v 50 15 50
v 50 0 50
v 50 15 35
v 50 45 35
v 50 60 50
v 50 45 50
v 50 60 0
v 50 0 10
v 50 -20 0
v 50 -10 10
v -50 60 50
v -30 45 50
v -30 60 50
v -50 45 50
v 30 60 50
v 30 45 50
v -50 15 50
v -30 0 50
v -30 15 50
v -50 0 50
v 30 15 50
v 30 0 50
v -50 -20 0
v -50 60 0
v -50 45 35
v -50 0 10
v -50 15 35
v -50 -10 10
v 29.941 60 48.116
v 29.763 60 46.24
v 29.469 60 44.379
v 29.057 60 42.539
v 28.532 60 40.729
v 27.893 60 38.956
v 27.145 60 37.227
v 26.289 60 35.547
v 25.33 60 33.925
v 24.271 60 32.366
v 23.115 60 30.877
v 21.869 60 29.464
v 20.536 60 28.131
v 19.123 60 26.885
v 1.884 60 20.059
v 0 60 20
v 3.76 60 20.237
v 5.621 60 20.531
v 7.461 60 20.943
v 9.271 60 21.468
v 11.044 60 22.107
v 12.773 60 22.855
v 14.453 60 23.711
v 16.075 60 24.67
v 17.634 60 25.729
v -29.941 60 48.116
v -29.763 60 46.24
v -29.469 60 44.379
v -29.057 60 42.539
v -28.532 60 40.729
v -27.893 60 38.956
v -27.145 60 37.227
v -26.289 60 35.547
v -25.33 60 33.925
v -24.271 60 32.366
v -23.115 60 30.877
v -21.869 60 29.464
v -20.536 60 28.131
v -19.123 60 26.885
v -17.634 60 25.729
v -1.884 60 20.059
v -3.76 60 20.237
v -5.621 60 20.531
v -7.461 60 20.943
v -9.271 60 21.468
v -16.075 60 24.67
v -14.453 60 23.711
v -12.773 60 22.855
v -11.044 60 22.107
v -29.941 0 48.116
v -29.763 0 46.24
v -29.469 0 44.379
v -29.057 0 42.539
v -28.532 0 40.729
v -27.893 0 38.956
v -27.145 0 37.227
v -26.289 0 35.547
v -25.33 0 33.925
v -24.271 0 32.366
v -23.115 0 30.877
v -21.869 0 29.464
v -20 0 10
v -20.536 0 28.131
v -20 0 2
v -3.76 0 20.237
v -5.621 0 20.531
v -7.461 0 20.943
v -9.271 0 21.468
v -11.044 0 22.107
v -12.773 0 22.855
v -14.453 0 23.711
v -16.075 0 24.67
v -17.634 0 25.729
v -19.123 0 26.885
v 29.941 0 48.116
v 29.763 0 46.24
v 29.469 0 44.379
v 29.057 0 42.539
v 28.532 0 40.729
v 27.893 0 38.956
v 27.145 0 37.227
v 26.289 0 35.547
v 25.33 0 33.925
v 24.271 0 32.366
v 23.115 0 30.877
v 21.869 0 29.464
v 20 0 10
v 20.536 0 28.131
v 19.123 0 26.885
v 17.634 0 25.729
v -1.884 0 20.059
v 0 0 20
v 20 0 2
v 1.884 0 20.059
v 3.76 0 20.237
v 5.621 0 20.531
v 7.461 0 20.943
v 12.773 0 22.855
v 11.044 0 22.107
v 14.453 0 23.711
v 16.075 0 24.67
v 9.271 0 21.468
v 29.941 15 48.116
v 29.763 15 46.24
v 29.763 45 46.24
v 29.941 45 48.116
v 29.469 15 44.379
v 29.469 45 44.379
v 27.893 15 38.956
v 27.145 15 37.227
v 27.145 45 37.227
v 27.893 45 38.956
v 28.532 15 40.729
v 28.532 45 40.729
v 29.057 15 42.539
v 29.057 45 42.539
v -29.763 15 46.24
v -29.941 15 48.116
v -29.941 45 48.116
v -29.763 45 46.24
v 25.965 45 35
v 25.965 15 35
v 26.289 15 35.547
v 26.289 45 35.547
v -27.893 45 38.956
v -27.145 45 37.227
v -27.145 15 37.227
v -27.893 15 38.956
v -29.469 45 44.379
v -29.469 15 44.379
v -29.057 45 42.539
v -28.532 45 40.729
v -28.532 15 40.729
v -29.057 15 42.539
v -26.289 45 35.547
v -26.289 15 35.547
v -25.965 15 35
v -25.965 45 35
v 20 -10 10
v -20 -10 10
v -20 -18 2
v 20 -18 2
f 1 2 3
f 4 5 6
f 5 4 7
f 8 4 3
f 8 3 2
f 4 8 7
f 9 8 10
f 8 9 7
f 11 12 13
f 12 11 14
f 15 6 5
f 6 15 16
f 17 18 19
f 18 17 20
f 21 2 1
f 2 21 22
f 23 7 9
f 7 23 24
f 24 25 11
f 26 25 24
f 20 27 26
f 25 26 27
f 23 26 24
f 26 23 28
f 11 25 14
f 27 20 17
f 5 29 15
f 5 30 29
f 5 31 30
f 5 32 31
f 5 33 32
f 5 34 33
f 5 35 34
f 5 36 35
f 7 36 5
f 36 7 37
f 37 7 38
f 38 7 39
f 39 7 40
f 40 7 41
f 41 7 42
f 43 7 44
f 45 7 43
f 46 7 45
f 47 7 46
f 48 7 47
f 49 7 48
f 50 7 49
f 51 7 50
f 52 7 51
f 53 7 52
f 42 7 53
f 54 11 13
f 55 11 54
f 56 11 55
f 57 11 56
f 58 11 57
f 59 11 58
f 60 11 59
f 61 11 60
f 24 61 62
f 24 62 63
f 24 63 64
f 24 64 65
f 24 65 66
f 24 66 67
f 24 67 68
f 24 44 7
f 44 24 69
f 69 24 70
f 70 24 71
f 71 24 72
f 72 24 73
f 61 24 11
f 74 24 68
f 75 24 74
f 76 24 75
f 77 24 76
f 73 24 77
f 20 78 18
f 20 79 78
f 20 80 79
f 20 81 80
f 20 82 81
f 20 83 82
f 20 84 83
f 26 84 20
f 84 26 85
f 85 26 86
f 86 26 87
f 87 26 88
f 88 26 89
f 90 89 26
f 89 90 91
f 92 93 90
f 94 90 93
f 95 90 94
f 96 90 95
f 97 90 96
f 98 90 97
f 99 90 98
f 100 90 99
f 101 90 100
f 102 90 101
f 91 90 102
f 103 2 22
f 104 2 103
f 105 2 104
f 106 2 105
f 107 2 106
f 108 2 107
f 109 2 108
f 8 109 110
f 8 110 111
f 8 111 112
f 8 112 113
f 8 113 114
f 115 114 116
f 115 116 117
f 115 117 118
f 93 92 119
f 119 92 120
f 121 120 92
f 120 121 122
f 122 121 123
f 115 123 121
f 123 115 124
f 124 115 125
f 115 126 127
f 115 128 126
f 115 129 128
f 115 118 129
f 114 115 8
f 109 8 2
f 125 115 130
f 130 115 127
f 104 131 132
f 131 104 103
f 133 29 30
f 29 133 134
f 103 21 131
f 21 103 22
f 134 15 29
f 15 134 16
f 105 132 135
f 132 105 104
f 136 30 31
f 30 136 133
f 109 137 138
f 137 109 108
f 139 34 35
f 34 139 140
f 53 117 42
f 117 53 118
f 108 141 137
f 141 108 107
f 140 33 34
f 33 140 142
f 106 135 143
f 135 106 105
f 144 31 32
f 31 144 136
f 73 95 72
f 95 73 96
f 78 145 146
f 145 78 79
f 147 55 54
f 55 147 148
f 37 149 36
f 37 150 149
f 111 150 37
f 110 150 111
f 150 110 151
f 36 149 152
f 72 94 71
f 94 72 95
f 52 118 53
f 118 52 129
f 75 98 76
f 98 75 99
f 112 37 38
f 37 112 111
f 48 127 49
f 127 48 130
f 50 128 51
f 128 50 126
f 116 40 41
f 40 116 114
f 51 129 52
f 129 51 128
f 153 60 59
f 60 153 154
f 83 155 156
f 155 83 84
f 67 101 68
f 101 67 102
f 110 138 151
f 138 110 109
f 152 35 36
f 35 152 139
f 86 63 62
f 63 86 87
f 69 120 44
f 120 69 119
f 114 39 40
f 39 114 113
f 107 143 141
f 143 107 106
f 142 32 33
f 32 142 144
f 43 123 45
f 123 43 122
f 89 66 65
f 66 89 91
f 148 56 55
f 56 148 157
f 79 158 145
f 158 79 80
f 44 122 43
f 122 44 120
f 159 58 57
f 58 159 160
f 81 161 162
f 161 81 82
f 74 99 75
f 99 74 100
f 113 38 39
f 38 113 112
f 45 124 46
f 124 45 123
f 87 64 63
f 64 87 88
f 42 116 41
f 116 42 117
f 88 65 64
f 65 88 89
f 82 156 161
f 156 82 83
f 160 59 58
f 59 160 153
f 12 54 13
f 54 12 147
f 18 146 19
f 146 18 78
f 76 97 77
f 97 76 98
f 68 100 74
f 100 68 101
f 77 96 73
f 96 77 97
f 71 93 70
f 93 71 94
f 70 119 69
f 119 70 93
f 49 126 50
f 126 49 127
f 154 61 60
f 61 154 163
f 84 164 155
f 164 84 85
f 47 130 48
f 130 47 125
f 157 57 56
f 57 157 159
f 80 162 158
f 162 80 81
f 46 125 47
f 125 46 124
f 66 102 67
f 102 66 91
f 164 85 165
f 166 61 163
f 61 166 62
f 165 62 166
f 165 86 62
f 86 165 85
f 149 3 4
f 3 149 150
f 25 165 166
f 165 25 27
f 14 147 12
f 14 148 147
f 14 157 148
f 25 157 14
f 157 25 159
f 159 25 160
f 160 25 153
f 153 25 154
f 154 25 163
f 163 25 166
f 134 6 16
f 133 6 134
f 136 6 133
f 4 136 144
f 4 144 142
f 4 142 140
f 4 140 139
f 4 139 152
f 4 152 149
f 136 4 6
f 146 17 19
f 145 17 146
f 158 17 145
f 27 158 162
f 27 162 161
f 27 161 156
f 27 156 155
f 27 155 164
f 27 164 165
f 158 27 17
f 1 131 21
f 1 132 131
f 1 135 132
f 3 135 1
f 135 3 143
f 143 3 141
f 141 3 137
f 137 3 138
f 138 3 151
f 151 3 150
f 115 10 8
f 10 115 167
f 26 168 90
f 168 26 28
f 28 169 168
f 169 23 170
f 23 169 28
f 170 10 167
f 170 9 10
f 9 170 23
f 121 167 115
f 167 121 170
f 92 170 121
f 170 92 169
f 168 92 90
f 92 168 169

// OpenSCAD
$fn=100;
mm=1; // define units
degrees=1;

include <../lib.scad>

p1=$preview?1+1/$fs:1;// A "zero" over-cut for prettier previews.
module example_137(){
	width=100*mm;
	block_length=60;
	module block(){
		height=50;
		length=block_length; // To hand out of env.
		difference(){
			Cube([width,length,height],center=X+Y);
			translate(height*Z)
				rotate(-90*degrees*X)
					cylinder(r=30,h=length*p1,center=true);
			slot_depth=15;
			translate((height-slot_depth)*Z)
				Cube([width*p1,30,slot_depth*p1],center=X+Y);}};
	module slat(){
		height=10;
		flat_length=10;
		// TODO: That =2*Y= is ugly.
		cut_heigt=2;
		side_width=30;
		difference(){
			union(){
				Cube([width,flat_length,height],center=X+2*Y);
				translate(-flat_length*Y)
					rotate(-90*degrees*Z)
						ramp(10,height,width,center=X);}
			translate(cut_heigt*Z)
				Cube([width-2*side_width,
							2*flat_length*p1,
							(height-cut_heigt)*p1],
						 center=X+2*Y);}};
	translate(block_length/2*Y)
		block();
	slat();}

example_137();
